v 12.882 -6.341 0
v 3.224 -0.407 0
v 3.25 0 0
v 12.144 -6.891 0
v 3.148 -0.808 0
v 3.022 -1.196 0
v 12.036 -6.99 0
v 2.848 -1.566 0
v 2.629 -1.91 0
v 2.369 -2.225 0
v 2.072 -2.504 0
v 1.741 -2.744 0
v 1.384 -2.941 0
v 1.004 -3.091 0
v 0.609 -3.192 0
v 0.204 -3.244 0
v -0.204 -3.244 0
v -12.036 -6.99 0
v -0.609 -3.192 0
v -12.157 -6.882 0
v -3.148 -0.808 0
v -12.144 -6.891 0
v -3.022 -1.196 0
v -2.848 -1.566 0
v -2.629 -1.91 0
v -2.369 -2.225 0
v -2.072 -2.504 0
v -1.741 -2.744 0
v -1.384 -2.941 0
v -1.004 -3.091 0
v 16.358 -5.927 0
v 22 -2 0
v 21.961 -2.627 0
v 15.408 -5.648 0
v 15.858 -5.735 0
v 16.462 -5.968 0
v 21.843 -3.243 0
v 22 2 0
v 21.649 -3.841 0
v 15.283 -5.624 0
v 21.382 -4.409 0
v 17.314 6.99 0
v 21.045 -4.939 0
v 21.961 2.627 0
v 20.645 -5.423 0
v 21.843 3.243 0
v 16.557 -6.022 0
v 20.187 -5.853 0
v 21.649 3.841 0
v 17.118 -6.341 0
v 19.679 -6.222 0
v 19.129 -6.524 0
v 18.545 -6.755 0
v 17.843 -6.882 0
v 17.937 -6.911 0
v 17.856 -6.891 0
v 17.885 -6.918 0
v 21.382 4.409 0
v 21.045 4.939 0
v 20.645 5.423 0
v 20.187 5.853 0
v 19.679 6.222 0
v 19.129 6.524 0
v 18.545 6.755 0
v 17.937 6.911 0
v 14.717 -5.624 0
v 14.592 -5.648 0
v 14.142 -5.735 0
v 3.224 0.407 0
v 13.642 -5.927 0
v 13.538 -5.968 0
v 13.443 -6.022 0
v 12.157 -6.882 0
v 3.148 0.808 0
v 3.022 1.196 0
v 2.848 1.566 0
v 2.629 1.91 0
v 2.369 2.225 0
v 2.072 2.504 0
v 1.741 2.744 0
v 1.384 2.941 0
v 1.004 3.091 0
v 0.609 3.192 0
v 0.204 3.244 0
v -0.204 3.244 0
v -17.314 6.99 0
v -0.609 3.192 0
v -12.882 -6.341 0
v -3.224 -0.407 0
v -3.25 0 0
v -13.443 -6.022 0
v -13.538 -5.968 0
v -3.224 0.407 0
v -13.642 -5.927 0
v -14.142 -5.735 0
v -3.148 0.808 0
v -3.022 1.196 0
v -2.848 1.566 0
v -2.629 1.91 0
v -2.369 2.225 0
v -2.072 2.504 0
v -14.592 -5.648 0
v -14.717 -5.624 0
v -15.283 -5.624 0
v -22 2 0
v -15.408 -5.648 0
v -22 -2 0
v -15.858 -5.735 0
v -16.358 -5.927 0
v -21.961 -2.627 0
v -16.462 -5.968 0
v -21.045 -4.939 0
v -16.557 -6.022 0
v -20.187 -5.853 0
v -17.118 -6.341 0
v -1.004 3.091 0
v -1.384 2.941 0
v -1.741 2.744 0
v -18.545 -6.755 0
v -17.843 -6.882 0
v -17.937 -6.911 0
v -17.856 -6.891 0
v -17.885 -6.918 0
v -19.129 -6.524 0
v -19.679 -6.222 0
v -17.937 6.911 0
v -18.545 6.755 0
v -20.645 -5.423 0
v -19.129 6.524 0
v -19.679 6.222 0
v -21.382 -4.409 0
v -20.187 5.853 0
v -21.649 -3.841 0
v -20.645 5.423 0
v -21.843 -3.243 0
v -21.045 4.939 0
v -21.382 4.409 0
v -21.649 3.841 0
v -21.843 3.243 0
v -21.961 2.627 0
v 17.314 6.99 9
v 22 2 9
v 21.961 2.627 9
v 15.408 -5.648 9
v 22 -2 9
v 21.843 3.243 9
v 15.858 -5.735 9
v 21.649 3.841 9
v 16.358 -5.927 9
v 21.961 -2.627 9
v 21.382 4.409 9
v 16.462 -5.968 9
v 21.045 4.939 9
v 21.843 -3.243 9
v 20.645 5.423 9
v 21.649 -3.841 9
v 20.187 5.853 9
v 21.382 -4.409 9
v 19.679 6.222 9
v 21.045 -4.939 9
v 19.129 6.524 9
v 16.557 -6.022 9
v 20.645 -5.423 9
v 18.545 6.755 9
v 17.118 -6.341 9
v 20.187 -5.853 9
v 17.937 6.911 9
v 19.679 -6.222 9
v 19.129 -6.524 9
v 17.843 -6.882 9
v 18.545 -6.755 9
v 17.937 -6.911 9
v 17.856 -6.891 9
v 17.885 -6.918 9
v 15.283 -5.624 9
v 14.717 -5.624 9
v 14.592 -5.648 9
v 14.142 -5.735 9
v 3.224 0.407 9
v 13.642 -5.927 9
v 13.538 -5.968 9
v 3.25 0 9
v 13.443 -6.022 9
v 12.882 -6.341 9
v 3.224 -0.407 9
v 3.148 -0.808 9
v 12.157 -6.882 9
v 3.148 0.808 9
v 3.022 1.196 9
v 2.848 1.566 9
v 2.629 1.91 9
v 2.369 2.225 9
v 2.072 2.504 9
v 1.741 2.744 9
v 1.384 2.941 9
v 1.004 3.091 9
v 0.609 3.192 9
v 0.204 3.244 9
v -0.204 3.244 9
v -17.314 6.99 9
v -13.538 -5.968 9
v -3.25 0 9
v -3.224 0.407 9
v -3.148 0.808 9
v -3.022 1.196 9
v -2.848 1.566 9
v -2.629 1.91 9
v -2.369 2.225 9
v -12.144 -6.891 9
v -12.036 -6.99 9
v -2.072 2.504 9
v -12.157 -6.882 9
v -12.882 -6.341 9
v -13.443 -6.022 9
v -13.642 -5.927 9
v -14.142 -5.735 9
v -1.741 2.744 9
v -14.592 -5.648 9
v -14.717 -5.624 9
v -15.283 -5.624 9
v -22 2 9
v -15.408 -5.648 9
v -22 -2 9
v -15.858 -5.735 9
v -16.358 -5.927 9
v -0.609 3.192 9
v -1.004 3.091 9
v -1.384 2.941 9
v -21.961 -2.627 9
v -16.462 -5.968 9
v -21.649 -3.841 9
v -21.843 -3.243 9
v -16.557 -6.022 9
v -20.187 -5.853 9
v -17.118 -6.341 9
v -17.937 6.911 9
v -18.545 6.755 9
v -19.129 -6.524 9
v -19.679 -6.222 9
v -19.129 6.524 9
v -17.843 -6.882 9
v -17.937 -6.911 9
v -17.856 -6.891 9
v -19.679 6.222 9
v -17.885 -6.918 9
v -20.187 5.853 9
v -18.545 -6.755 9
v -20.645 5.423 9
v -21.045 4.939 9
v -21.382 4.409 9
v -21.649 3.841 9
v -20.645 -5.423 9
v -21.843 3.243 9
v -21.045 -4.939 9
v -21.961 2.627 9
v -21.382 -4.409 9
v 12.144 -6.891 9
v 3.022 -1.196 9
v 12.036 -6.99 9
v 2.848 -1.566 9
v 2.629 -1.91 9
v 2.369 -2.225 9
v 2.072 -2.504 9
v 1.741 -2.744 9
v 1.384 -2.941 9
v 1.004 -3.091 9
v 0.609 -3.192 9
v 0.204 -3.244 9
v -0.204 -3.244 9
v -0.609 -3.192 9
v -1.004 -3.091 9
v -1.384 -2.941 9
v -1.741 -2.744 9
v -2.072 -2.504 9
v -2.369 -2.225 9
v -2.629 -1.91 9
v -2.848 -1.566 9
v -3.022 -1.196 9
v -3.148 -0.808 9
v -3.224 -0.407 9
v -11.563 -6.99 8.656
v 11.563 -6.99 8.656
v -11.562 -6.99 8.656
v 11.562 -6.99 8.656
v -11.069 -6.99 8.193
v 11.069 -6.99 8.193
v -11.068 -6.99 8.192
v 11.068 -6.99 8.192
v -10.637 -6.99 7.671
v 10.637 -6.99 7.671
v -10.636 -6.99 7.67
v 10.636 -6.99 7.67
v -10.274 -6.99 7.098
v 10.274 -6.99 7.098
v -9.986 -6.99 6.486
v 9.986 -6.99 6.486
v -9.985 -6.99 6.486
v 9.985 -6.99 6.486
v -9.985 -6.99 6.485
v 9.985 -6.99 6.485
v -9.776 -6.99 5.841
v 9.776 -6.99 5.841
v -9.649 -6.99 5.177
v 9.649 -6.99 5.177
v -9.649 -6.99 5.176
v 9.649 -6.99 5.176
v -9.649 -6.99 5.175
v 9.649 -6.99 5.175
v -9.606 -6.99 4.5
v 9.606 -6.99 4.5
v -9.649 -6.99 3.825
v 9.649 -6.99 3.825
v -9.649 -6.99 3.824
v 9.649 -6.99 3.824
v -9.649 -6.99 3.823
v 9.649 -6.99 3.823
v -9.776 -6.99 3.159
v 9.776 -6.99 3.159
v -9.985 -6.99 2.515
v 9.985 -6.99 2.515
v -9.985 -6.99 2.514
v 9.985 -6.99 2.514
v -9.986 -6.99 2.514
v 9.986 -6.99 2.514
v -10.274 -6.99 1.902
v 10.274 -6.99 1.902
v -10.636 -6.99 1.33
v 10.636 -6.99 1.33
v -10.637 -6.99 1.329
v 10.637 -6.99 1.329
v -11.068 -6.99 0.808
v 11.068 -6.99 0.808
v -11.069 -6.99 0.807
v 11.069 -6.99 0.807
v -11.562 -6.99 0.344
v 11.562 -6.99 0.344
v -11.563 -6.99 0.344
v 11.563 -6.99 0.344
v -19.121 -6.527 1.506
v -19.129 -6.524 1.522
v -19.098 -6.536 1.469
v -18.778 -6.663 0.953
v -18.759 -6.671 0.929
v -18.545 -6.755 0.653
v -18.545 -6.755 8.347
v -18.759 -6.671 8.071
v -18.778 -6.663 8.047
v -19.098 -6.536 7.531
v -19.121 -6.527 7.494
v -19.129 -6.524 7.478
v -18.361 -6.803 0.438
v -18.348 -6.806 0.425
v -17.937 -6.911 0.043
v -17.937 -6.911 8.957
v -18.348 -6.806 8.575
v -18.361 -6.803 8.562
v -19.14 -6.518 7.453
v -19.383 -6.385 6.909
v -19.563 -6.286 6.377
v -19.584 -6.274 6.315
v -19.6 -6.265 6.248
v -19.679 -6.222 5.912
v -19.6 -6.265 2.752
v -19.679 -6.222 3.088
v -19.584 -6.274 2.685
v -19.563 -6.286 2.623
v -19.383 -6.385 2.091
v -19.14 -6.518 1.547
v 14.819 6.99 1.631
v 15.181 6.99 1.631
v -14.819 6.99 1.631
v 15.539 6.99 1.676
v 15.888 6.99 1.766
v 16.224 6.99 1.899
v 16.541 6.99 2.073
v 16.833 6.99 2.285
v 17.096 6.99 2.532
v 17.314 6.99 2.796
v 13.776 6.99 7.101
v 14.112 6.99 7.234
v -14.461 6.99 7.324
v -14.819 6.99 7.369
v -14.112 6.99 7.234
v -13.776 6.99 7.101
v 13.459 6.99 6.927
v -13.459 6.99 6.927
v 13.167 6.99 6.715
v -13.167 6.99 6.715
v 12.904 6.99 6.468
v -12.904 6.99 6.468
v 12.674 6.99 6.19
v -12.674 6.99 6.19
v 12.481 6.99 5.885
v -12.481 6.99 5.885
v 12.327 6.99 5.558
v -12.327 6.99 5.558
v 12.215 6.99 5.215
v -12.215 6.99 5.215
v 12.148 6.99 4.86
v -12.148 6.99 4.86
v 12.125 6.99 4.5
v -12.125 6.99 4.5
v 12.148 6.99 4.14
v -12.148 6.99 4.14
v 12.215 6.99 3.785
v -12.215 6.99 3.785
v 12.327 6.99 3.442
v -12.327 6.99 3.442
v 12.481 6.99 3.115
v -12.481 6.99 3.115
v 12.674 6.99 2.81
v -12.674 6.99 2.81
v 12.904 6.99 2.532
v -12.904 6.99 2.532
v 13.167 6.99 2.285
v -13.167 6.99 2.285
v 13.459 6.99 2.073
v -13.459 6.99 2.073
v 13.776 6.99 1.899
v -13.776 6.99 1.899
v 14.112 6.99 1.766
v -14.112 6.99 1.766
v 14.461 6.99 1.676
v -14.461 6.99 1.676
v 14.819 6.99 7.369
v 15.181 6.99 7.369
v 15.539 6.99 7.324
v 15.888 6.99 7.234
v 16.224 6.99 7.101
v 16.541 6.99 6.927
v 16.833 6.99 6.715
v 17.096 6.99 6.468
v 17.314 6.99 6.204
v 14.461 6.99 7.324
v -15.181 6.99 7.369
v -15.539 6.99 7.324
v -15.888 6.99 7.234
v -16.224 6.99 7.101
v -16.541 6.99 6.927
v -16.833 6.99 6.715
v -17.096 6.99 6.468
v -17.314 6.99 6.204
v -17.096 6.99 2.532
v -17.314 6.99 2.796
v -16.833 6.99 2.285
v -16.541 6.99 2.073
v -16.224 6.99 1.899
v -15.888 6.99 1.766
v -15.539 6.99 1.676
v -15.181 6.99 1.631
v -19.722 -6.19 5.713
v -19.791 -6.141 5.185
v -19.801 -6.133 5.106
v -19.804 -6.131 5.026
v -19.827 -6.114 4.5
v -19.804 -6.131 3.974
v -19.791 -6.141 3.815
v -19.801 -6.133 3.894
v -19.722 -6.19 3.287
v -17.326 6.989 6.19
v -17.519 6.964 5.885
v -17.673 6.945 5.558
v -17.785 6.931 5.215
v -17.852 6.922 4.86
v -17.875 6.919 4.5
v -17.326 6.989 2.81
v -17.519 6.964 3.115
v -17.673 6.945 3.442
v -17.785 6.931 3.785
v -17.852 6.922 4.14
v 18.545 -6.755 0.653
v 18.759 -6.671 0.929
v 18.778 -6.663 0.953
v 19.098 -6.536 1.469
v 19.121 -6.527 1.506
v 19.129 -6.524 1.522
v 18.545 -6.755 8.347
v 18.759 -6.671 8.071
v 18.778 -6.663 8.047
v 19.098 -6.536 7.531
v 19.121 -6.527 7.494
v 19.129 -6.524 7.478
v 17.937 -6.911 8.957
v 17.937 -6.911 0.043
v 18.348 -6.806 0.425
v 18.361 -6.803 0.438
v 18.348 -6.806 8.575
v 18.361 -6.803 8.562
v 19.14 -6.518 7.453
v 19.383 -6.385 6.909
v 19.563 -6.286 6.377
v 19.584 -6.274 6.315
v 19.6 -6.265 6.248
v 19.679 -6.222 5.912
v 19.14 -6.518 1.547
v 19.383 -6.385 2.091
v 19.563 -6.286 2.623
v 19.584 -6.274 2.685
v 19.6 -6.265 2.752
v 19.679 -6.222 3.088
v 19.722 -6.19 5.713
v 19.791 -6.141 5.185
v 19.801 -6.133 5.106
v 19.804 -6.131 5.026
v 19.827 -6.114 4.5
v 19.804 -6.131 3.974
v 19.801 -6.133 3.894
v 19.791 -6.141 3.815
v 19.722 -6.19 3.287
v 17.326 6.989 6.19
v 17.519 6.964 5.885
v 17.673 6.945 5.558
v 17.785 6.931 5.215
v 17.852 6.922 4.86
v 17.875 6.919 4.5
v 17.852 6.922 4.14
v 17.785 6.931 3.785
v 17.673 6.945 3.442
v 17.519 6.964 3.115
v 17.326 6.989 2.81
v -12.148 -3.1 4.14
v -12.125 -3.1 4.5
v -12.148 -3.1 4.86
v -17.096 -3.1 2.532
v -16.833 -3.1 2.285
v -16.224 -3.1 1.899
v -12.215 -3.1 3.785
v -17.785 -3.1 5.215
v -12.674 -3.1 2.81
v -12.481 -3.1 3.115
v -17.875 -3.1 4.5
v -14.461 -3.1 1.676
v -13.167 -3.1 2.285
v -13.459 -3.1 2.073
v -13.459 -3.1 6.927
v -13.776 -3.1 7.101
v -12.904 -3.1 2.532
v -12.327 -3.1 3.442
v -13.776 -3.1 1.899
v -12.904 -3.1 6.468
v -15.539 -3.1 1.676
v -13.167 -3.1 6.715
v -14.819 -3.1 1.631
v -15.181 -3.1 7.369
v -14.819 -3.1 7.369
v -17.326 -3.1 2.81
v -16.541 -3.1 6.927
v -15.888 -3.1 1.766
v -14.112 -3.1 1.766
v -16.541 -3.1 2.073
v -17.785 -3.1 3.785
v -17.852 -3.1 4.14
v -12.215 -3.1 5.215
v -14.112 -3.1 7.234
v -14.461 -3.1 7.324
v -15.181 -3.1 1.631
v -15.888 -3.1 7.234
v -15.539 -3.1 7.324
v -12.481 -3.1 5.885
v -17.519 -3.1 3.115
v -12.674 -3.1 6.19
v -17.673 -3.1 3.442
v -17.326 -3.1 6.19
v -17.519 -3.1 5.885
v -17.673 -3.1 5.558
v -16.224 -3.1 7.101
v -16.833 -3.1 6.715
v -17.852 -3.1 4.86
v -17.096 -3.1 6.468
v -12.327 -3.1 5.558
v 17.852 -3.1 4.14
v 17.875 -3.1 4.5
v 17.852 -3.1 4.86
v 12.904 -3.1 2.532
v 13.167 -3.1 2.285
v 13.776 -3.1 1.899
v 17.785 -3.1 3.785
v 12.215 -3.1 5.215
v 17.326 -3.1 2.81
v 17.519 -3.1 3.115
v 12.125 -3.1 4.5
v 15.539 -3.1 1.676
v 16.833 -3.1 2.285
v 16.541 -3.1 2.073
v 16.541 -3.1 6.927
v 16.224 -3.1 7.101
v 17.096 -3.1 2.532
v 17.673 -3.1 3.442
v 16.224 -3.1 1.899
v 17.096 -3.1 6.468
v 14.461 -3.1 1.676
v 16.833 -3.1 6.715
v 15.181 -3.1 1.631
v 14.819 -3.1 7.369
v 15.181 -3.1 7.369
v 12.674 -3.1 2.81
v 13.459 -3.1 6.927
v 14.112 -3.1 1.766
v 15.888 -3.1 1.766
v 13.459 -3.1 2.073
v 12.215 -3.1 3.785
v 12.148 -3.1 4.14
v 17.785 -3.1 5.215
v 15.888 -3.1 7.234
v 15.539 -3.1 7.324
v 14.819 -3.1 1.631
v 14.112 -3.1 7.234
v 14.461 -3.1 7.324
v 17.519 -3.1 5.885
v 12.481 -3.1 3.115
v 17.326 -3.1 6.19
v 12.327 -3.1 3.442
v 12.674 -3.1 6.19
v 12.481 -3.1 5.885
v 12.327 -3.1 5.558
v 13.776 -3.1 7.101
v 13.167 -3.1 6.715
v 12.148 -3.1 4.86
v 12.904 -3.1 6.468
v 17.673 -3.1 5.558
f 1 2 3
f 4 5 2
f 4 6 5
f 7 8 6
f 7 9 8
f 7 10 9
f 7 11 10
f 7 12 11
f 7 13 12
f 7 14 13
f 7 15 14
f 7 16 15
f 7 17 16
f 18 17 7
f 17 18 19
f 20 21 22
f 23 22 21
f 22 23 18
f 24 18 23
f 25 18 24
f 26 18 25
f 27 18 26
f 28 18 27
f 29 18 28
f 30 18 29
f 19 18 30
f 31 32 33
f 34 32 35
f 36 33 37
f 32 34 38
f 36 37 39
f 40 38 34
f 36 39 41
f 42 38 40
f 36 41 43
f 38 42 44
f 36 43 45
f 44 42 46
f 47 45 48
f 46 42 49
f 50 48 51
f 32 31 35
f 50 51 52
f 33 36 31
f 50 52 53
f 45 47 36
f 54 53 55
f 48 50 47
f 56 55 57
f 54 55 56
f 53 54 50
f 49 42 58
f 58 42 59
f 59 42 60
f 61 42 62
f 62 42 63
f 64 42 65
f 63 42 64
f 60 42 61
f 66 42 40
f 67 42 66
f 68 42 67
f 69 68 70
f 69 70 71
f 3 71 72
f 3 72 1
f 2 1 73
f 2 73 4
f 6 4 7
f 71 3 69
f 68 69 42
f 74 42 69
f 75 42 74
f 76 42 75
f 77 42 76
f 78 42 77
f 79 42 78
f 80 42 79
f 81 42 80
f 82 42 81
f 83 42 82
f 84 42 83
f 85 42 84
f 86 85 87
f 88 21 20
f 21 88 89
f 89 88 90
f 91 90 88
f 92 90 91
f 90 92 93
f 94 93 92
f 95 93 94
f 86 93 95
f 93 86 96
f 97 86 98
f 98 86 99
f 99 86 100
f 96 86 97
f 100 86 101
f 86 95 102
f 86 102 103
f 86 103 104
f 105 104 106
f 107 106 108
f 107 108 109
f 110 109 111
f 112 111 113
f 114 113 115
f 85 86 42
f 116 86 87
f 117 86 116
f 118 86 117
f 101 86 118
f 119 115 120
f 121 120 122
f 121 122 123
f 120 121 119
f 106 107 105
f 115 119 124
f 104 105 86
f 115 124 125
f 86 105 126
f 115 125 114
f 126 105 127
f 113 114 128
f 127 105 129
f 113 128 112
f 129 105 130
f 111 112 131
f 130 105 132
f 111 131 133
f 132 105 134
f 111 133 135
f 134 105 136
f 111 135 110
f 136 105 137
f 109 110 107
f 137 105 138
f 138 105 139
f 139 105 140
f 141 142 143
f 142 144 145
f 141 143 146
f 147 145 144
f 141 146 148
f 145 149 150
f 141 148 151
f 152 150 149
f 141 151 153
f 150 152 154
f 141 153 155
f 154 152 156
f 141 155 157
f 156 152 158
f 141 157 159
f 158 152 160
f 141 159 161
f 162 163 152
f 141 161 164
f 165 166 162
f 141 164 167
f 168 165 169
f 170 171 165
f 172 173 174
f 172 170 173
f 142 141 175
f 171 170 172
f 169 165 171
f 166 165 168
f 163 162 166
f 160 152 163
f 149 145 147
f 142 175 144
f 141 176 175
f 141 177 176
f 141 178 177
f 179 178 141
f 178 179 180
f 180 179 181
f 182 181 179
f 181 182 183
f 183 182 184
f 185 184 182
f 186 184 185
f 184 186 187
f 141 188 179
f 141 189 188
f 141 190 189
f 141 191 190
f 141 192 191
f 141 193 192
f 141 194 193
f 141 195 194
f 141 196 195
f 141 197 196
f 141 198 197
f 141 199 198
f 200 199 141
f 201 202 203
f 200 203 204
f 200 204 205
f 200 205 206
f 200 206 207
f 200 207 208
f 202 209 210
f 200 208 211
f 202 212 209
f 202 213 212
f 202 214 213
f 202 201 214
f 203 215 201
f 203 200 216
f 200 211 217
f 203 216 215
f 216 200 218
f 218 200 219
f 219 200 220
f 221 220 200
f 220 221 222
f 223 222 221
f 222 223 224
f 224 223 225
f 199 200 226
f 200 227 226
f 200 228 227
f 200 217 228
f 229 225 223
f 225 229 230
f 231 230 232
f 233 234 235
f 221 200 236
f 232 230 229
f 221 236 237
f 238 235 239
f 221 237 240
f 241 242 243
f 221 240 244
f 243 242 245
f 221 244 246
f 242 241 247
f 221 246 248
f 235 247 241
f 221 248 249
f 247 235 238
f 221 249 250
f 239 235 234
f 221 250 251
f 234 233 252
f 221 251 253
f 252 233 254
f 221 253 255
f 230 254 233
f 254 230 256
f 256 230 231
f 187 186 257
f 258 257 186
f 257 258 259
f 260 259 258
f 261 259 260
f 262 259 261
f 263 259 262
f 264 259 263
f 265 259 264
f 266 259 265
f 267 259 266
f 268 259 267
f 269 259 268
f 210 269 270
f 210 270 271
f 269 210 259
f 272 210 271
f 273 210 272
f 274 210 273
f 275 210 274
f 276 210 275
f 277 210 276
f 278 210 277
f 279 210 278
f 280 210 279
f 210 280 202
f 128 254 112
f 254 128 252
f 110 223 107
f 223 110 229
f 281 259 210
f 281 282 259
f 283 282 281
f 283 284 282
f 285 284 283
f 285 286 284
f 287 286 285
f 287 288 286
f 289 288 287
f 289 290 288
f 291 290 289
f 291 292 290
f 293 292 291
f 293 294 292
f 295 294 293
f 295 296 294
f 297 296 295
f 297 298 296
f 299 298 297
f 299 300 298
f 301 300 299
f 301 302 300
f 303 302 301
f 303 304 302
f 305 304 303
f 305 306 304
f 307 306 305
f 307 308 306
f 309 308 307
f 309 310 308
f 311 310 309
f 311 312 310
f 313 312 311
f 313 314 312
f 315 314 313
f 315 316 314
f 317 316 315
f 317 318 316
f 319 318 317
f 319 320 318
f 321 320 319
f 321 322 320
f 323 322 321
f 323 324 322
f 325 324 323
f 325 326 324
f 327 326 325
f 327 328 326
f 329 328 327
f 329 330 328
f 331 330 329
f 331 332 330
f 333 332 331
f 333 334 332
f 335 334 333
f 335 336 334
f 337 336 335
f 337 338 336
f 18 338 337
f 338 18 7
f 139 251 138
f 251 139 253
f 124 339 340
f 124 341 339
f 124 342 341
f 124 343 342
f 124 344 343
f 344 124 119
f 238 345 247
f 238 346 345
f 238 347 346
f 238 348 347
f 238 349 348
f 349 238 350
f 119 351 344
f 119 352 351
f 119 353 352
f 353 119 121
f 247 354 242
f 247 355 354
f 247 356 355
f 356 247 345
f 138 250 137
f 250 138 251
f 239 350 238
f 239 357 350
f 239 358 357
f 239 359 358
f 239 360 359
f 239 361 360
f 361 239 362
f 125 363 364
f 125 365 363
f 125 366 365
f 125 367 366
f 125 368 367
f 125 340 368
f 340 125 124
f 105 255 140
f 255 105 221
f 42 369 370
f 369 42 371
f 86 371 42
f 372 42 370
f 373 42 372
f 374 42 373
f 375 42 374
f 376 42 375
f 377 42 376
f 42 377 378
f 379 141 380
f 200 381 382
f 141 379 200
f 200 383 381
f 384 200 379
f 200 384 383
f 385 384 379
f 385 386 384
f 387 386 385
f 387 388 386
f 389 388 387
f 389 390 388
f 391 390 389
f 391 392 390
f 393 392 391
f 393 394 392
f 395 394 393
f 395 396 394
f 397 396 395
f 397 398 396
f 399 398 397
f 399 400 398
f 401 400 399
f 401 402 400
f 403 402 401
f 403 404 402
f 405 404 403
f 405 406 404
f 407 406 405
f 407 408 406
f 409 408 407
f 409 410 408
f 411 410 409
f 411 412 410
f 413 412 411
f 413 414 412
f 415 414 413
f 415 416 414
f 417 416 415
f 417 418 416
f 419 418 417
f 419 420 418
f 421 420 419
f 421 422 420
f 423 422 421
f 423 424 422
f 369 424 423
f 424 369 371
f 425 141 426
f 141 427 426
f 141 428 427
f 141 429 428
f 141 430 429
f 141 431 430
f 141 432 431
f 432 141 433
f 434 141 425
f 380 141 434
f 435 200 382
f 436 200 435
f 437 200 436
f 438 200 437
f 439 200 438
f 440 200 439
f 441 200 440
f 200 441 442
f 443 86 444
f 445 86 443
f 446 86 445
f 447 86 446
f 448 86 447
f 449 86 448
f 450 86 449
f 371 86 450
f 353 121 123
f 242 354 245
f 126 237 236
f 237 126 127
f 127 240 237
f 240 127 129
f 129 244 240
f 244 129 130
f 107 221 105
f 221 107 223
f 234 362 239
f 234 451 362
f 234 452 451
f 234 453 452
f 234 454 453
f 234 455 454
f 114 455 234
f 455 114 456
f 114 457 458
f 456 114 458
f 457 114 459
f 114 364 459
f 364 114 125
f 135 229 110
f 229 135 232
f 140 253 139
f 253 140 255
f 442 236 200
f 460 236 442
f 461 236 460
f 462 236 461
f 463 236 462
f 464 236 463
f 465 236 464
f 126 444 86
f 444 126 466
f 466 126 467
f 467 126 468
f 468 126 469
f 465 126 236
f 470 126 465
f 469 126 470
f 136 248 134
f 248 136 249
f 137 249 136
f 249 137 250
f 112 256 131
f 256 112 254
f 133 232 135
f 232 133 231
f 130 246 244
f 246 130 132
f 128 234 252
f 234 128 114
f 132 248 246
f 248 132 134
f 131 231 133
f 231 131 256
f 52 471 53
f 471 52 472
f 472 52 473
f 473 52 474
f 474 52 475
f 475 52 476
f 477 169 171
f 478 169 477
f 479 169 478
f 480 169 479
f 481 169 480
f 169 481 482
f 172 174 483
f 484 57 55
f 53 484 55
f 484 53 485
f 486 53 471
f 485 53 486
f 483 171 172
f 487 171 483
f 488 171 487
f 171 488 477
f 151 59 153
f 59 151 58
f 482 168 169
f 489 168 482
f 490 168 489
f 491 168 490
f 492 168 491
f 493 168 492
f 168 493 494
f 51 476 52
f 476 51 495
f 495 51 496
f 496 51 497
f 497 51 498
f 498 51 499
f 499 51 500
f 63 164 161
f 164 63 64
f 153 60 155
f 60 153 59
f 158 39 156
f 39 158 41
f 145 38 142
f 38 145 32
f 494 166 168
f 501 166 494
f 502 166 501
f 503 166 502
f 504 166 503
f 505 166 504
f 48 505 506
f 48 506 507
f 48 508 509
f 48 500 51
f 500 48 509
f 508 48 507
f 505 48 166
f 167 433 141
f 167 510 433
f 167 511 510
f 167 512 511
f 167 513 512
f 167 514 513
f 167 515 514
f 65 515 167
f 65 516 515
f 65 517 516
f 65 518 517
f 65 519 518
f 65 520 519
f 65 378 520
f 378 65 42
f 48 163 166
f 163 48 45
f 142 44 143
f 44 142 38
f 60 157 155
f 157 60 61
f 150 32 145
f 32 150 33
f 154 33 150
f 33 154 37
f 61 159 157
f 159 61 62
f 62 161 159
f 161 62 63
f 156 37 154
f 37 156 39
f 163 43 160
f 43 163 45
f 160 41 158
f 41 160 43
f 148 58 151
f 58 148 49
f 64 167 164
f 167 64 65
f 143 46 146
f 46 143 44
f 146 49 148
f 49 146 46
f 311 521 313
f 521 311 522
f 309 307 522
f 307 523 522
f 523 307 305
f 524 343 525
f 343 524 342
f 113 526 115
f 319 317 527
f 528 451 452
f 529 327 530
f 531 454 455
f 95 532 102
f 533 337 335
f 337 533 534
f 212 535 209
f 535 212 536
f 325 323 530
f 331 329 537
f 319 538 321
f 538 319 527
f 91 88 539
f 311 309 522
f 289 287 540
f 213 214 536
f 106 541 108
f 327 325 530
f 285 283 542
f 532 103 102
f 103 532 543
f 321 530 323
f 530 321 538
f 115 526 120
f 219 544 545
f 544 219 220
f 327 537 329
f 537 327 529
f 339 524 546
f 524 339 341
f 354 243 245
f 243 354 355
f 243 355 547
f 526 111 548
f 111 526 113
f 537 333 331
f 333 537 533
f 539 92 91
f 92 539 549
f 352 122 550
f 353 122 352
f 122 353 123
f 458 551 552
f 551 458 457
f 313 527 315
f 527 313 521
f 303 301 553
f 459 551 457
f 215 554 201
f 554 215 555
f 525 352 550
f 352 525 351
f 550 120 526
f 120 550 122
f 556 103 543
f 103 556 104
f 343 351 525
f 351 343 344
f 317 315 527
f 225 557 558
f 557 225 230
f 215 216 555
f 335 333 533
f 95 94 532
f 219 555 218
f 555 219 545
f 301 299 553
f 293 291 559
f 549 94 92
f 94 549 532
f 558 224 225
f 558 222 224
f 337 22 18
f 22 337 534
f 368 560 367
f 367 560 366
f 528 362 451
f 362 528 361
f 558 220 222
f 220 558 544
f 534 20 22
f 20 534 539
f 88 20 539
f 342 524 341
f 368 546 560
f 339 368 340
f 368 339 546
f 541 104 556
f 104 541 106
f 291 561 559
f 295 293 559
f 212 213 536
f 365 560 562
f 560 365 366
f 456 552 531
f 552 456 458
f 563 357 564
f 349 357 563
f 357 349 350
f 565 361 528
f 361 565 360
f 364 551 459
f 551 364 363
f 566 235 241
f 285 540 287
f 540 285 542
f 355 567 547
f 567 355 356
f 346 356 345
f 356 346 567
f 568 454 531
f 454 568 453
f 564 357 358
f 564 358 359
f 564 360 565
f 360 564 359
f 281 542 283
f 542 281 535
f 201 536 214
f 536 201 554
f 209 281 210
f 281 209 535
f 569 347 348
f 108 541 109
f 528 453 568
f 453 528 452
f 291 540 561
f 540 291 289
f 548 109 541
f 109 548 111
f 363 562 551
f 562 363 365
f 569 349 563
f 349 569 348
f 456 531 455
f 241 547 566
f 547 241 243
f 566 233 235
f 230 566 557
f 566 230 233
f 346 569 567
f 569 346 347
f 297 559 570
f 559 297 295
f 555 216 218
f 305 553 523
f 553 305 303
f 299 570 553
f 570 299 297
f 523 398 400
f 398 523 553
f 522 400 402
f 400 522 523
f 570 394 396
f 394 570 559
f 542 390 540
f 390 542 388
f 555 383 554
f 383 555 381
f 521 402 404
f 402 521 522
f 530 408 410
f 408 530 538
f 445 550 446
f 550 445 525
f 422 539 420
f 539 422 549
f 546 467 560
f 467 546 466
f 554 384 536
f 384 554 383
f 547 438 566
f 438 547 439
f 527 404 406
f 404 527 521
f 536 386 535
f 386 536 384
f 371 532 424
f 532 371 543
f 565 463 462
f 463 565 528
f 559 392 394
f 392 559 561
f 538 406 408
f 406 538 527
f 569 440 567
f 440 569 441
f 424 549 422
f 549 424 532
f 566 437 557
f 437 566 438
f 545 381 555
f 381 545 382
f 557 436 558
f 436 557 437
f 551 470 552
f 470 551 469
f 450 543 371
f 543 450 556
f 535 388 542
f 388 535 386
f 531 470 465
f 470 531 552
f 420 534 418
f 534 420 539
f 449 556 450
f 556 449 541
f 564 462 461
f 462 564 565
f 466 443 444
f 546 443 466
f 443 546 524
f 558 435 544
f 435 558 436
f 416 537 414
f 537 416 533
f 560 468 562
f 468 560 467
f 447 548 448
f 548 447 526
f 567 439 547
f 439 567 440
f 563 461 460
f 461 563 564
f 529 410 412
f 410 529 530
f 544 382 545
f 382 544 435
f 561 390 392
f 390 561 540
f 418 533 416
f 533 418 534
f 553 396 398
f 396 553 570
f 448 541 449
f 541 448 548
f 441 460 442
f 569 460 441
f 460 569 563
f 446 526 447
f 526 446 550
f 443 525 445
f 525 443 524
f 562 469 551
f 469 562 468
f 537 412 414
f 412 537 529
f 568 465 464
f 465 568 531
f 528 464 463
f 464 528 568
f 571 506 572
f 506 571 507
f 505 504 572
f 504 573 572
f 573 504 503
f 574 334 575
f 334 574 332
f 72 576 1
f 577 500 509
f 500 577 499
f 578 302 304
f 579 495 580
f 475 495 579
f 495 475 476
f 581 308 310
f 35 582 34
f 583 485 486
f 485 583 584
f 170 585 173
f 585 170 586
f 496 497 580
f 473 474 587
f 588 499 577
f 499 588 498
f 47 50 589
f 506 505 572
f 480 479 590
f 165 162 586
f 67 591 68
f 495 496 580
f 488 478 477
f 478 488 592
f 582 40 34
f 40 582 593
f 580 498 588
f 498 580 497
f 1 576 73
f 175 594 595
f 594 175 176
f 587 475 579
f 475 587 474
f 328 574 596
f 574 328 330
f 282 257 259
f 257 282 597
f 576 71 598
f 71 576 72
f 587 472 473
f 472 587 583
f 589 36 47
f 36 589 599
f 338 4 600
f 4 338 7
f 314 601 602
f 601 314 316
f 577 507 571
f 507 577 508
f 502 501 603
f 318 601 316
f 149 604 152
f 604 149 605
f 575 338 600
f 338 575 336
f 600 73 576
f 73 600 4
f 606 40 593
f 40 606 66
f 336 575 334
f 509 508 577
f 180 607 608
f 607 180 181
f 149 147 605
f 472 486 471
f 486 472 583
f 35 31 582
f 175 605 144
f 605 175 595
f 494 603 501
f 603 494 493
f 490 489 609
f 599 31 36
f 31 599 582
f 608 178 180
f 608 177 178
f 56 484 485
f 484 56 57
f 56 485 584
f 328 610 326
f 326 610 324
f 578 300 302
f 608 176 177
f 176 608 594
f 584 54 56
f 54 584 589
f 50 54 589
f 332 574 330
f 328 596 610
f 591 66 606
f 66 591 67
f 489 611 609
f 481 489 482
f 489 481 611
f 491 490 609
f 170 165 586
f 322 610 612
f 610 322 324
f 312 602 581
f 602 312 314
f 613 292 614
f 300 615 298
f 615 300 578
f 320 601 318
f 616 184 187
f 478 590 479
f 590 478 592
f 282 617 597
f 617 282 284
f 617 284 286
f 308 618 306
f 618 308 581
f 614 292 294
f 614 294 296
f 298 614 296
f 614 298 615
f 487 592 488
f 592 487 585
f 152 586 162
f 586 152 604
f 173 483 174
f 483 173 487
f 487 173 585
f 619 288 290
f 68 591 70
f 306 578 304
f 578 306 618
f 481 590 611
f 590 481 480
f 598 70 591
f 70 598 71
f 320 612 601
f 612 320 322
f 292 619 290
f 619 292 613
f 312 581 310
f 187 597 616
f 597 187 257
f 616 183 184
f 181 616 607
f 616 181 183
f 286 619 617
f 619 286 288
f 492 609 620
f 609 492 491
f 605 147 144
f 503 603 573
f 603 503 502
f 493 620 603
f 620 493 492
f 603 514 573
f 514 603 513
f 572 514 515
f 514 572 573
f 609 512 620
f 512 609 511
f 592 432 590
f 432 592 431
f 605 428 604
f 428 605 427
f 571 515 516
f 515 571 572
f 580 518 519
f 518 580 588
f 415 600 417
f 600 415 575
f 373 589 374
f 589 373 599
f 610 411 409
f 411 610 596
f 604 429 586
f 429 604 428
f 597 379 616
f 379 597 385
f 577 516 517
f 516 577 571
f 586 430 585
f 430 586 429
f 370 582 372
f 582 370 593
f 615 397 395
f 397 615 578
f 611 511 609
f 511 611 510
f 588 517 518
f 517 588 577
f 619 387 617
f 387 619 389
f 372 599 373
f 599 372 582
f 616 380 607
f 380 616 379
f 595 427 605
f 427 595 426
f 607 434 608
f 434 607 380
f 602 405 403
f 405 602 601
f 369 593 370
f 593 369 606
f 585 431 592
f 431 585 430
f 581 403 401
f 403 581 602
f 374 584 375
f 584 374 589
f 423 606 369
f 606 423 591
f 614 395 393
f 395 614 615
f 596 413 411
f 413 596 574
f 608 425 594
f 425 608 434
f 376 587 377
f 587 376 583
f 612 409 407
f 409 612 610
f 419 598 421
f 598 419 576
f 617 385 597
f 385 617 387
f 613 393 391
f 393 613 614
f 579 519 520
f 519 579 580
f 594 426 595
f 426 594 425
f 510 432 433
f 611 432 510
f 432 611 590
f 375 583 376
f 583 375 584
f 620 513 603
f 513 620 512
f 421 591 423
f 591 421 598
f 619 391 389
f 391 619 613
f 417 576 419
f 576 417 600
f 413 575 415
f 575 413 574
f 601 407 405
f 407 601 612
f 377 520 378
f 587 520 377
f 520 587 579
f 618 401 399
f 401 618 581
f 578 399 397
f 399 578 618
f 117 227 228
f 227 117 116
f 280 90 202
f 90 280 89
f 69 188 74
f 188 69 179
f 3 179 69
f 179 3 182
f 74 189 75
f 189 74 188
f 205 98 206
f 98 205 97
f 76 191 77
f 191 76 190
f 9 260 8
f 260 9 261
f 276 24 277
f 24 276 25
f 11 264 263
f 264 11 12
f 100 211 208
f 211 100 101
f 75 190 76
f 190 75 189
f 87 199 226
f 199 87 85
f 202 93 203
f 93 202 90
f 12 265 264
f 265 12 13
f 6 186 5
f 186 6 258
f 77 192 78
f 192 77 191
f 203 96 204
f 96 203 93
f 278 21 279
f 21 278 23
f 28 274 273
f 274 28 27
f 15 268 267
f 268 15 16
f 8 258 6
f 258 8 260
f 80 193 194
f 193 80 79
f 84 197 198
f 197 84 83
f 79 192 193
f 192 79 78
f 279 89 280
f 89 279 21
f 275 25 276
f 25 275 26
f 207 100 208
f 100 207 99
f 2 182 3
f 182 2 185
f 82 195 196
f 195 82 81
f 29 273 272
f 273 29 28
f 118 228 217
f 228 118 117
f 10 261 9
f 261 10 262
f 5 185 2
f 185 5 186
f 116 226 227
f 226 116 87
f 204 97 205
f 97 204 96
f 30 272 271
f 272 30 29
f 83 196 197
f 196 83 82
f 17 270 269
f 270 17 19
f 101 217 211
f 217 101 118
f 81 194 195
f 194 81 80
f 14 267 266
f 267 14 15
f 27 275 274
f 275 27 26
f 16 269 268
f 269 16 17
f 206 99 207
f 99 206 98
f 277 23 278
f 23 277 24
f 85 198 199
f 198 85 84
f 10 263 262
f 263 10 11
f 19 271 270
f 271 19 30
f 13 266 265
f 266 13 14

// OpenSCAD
$fn = 50;


difference() {
	union() {
		cylinder(h = 9, r = 7.0000000000);
		translate(v = [-7.5000000000, 0.0000000000, 0]) {
			hull() {
				translate(v = [-9.5000000000, 2.0000000000, 0]) {
					cylinder(h = 9, r = 5);
				}
				translate(v = [9.5000000000, 2.0000000000, 0]) {
					cylinder(h = 9, r = 5);
				}
				translate(v = [-9.5000000000, -2.0000000000, 0]) {
					cylinder(h = 9, r = 5);
				}
				translate(v = [9.5000000000, -2.0000000000, 0]) {
					cylinder(h = 9, r = 5);
				}
			}
		}
		translate(v = [-7.5000000000, 0.0000000000, 0]) {
			hull() {
				translate(v = [-9.5000000000, 2.0000000000, 0]) {
					cylinder(h = 9, r = 5);
				}
				translate(v = [9.5000000000, 2.0000000000, 0]) {
					cylinder(h = 9, r = 5);
				}
				translate(v = [-9.5000000000, -2.0000000000, 0]) {
					cylinder(h = 9, r = 5);
				}
				translate(v = [9.5000000000, -2.0000000000, 0]) {
					cylinder(h = 9, r = 5);
				}
			}
		}
		translate(v = [7.5000000000, 0.0000000000, 0]) {
			hull() {
				translate(v = [-9.5000000000, 2.0000000000, 0]) {
					cylinder(h = 9, r = 5);
				}
				translate(v = [9.5000000000, 2.0000000000, 0]) {
					cylinder(h = 9, r = 5);
				}
				translate(v = [-9.5000000000, -2.0000000000, 0]) {
					cylinder(h = 9, r = 5);
				}
				translate(v = [9.5000000000, -2.0000000000, 0]) {
					cylinder(h = 9, r = 5);
				}
			}
		}
		translate(v = [7.5000000000, 0.0000000000, 0]) {
			hull() {
				translate(v = [-9.5000000000, 2.0000000000, 0]) {
					cylinder(h = 9, r = 5);
				}
				translate(v = [9.5000000000, 2.0000000000, 0]) {
					cylinder(h = 9, r = 5);
				}
				translate(v = [-9.5000000000, -2.0000000000, 0]) {
					cylinder(h = 9, r = 5);
				}
				translate(v = [9.5000000000, -2.0000000000, 0]) {
					cylinder(h = 9, r = 5);
				}
			}
		}
	}
	union() {
		translate(v = [-15.0000000000, -7.0000000000, 4.5000000000]) {
			rotate(a = [90, 0, 0]) {
				difference() {
					union() {
						#translate(v = [0, 0, -14.0000000000]) {
							cylinder(h = 14, r = 2.6000000000);
						}
						#translate(v = [0, 0, -3.9000000000]) {
							cylinder(h = 3.9000000000, r1 = 2.8750000000, r2 = 5.4000000000);
						}
						#translate(v = [0, 0, -14.0000000000]) {
							cylinder(h = 14, r = 2.8750000000);
						}
						#translate(v = [0, 0, -14.0000000000]) {
							cylinder(h = 14, r = 2.6000000000);
						}
					}
					union();
				}
			}
		}
		translate(v = [15.0000000000, -7.0000000000, 4.5000000000]) {
			rotate(a = [90, 0, 0]) {
				difference() {
					union() {
						#translate(v = [0, 0, -14.0000000000]) {
							cylinder(h = 14, r = 2.6000000000);
						}
						#translate(v = [0, 0, -3.9000000000]) {
							cylinder(h = 3.9000000000, r1 = 2.8750000000, r2 = 5.4000000000);
						}
						#translate(v = [0, 0, -14.0000000000]) {
							cylinder(h = 14, r = 2.8750000000);
						}
						#translate(v = [0, 0, -14.0000000000]) {
							cylinder(h = 14, r = 2.6000000000);
						}
					}
					union();
				}
			}
		}
		translate(v = [0, 0, -100]) {
			cylinder(h = 200, r = 3.2500000000);
		}
		translate(v = [0, 0, -100]) {
			cylinder(h = 200, r = 1.8000000000);
		}
	}
}
